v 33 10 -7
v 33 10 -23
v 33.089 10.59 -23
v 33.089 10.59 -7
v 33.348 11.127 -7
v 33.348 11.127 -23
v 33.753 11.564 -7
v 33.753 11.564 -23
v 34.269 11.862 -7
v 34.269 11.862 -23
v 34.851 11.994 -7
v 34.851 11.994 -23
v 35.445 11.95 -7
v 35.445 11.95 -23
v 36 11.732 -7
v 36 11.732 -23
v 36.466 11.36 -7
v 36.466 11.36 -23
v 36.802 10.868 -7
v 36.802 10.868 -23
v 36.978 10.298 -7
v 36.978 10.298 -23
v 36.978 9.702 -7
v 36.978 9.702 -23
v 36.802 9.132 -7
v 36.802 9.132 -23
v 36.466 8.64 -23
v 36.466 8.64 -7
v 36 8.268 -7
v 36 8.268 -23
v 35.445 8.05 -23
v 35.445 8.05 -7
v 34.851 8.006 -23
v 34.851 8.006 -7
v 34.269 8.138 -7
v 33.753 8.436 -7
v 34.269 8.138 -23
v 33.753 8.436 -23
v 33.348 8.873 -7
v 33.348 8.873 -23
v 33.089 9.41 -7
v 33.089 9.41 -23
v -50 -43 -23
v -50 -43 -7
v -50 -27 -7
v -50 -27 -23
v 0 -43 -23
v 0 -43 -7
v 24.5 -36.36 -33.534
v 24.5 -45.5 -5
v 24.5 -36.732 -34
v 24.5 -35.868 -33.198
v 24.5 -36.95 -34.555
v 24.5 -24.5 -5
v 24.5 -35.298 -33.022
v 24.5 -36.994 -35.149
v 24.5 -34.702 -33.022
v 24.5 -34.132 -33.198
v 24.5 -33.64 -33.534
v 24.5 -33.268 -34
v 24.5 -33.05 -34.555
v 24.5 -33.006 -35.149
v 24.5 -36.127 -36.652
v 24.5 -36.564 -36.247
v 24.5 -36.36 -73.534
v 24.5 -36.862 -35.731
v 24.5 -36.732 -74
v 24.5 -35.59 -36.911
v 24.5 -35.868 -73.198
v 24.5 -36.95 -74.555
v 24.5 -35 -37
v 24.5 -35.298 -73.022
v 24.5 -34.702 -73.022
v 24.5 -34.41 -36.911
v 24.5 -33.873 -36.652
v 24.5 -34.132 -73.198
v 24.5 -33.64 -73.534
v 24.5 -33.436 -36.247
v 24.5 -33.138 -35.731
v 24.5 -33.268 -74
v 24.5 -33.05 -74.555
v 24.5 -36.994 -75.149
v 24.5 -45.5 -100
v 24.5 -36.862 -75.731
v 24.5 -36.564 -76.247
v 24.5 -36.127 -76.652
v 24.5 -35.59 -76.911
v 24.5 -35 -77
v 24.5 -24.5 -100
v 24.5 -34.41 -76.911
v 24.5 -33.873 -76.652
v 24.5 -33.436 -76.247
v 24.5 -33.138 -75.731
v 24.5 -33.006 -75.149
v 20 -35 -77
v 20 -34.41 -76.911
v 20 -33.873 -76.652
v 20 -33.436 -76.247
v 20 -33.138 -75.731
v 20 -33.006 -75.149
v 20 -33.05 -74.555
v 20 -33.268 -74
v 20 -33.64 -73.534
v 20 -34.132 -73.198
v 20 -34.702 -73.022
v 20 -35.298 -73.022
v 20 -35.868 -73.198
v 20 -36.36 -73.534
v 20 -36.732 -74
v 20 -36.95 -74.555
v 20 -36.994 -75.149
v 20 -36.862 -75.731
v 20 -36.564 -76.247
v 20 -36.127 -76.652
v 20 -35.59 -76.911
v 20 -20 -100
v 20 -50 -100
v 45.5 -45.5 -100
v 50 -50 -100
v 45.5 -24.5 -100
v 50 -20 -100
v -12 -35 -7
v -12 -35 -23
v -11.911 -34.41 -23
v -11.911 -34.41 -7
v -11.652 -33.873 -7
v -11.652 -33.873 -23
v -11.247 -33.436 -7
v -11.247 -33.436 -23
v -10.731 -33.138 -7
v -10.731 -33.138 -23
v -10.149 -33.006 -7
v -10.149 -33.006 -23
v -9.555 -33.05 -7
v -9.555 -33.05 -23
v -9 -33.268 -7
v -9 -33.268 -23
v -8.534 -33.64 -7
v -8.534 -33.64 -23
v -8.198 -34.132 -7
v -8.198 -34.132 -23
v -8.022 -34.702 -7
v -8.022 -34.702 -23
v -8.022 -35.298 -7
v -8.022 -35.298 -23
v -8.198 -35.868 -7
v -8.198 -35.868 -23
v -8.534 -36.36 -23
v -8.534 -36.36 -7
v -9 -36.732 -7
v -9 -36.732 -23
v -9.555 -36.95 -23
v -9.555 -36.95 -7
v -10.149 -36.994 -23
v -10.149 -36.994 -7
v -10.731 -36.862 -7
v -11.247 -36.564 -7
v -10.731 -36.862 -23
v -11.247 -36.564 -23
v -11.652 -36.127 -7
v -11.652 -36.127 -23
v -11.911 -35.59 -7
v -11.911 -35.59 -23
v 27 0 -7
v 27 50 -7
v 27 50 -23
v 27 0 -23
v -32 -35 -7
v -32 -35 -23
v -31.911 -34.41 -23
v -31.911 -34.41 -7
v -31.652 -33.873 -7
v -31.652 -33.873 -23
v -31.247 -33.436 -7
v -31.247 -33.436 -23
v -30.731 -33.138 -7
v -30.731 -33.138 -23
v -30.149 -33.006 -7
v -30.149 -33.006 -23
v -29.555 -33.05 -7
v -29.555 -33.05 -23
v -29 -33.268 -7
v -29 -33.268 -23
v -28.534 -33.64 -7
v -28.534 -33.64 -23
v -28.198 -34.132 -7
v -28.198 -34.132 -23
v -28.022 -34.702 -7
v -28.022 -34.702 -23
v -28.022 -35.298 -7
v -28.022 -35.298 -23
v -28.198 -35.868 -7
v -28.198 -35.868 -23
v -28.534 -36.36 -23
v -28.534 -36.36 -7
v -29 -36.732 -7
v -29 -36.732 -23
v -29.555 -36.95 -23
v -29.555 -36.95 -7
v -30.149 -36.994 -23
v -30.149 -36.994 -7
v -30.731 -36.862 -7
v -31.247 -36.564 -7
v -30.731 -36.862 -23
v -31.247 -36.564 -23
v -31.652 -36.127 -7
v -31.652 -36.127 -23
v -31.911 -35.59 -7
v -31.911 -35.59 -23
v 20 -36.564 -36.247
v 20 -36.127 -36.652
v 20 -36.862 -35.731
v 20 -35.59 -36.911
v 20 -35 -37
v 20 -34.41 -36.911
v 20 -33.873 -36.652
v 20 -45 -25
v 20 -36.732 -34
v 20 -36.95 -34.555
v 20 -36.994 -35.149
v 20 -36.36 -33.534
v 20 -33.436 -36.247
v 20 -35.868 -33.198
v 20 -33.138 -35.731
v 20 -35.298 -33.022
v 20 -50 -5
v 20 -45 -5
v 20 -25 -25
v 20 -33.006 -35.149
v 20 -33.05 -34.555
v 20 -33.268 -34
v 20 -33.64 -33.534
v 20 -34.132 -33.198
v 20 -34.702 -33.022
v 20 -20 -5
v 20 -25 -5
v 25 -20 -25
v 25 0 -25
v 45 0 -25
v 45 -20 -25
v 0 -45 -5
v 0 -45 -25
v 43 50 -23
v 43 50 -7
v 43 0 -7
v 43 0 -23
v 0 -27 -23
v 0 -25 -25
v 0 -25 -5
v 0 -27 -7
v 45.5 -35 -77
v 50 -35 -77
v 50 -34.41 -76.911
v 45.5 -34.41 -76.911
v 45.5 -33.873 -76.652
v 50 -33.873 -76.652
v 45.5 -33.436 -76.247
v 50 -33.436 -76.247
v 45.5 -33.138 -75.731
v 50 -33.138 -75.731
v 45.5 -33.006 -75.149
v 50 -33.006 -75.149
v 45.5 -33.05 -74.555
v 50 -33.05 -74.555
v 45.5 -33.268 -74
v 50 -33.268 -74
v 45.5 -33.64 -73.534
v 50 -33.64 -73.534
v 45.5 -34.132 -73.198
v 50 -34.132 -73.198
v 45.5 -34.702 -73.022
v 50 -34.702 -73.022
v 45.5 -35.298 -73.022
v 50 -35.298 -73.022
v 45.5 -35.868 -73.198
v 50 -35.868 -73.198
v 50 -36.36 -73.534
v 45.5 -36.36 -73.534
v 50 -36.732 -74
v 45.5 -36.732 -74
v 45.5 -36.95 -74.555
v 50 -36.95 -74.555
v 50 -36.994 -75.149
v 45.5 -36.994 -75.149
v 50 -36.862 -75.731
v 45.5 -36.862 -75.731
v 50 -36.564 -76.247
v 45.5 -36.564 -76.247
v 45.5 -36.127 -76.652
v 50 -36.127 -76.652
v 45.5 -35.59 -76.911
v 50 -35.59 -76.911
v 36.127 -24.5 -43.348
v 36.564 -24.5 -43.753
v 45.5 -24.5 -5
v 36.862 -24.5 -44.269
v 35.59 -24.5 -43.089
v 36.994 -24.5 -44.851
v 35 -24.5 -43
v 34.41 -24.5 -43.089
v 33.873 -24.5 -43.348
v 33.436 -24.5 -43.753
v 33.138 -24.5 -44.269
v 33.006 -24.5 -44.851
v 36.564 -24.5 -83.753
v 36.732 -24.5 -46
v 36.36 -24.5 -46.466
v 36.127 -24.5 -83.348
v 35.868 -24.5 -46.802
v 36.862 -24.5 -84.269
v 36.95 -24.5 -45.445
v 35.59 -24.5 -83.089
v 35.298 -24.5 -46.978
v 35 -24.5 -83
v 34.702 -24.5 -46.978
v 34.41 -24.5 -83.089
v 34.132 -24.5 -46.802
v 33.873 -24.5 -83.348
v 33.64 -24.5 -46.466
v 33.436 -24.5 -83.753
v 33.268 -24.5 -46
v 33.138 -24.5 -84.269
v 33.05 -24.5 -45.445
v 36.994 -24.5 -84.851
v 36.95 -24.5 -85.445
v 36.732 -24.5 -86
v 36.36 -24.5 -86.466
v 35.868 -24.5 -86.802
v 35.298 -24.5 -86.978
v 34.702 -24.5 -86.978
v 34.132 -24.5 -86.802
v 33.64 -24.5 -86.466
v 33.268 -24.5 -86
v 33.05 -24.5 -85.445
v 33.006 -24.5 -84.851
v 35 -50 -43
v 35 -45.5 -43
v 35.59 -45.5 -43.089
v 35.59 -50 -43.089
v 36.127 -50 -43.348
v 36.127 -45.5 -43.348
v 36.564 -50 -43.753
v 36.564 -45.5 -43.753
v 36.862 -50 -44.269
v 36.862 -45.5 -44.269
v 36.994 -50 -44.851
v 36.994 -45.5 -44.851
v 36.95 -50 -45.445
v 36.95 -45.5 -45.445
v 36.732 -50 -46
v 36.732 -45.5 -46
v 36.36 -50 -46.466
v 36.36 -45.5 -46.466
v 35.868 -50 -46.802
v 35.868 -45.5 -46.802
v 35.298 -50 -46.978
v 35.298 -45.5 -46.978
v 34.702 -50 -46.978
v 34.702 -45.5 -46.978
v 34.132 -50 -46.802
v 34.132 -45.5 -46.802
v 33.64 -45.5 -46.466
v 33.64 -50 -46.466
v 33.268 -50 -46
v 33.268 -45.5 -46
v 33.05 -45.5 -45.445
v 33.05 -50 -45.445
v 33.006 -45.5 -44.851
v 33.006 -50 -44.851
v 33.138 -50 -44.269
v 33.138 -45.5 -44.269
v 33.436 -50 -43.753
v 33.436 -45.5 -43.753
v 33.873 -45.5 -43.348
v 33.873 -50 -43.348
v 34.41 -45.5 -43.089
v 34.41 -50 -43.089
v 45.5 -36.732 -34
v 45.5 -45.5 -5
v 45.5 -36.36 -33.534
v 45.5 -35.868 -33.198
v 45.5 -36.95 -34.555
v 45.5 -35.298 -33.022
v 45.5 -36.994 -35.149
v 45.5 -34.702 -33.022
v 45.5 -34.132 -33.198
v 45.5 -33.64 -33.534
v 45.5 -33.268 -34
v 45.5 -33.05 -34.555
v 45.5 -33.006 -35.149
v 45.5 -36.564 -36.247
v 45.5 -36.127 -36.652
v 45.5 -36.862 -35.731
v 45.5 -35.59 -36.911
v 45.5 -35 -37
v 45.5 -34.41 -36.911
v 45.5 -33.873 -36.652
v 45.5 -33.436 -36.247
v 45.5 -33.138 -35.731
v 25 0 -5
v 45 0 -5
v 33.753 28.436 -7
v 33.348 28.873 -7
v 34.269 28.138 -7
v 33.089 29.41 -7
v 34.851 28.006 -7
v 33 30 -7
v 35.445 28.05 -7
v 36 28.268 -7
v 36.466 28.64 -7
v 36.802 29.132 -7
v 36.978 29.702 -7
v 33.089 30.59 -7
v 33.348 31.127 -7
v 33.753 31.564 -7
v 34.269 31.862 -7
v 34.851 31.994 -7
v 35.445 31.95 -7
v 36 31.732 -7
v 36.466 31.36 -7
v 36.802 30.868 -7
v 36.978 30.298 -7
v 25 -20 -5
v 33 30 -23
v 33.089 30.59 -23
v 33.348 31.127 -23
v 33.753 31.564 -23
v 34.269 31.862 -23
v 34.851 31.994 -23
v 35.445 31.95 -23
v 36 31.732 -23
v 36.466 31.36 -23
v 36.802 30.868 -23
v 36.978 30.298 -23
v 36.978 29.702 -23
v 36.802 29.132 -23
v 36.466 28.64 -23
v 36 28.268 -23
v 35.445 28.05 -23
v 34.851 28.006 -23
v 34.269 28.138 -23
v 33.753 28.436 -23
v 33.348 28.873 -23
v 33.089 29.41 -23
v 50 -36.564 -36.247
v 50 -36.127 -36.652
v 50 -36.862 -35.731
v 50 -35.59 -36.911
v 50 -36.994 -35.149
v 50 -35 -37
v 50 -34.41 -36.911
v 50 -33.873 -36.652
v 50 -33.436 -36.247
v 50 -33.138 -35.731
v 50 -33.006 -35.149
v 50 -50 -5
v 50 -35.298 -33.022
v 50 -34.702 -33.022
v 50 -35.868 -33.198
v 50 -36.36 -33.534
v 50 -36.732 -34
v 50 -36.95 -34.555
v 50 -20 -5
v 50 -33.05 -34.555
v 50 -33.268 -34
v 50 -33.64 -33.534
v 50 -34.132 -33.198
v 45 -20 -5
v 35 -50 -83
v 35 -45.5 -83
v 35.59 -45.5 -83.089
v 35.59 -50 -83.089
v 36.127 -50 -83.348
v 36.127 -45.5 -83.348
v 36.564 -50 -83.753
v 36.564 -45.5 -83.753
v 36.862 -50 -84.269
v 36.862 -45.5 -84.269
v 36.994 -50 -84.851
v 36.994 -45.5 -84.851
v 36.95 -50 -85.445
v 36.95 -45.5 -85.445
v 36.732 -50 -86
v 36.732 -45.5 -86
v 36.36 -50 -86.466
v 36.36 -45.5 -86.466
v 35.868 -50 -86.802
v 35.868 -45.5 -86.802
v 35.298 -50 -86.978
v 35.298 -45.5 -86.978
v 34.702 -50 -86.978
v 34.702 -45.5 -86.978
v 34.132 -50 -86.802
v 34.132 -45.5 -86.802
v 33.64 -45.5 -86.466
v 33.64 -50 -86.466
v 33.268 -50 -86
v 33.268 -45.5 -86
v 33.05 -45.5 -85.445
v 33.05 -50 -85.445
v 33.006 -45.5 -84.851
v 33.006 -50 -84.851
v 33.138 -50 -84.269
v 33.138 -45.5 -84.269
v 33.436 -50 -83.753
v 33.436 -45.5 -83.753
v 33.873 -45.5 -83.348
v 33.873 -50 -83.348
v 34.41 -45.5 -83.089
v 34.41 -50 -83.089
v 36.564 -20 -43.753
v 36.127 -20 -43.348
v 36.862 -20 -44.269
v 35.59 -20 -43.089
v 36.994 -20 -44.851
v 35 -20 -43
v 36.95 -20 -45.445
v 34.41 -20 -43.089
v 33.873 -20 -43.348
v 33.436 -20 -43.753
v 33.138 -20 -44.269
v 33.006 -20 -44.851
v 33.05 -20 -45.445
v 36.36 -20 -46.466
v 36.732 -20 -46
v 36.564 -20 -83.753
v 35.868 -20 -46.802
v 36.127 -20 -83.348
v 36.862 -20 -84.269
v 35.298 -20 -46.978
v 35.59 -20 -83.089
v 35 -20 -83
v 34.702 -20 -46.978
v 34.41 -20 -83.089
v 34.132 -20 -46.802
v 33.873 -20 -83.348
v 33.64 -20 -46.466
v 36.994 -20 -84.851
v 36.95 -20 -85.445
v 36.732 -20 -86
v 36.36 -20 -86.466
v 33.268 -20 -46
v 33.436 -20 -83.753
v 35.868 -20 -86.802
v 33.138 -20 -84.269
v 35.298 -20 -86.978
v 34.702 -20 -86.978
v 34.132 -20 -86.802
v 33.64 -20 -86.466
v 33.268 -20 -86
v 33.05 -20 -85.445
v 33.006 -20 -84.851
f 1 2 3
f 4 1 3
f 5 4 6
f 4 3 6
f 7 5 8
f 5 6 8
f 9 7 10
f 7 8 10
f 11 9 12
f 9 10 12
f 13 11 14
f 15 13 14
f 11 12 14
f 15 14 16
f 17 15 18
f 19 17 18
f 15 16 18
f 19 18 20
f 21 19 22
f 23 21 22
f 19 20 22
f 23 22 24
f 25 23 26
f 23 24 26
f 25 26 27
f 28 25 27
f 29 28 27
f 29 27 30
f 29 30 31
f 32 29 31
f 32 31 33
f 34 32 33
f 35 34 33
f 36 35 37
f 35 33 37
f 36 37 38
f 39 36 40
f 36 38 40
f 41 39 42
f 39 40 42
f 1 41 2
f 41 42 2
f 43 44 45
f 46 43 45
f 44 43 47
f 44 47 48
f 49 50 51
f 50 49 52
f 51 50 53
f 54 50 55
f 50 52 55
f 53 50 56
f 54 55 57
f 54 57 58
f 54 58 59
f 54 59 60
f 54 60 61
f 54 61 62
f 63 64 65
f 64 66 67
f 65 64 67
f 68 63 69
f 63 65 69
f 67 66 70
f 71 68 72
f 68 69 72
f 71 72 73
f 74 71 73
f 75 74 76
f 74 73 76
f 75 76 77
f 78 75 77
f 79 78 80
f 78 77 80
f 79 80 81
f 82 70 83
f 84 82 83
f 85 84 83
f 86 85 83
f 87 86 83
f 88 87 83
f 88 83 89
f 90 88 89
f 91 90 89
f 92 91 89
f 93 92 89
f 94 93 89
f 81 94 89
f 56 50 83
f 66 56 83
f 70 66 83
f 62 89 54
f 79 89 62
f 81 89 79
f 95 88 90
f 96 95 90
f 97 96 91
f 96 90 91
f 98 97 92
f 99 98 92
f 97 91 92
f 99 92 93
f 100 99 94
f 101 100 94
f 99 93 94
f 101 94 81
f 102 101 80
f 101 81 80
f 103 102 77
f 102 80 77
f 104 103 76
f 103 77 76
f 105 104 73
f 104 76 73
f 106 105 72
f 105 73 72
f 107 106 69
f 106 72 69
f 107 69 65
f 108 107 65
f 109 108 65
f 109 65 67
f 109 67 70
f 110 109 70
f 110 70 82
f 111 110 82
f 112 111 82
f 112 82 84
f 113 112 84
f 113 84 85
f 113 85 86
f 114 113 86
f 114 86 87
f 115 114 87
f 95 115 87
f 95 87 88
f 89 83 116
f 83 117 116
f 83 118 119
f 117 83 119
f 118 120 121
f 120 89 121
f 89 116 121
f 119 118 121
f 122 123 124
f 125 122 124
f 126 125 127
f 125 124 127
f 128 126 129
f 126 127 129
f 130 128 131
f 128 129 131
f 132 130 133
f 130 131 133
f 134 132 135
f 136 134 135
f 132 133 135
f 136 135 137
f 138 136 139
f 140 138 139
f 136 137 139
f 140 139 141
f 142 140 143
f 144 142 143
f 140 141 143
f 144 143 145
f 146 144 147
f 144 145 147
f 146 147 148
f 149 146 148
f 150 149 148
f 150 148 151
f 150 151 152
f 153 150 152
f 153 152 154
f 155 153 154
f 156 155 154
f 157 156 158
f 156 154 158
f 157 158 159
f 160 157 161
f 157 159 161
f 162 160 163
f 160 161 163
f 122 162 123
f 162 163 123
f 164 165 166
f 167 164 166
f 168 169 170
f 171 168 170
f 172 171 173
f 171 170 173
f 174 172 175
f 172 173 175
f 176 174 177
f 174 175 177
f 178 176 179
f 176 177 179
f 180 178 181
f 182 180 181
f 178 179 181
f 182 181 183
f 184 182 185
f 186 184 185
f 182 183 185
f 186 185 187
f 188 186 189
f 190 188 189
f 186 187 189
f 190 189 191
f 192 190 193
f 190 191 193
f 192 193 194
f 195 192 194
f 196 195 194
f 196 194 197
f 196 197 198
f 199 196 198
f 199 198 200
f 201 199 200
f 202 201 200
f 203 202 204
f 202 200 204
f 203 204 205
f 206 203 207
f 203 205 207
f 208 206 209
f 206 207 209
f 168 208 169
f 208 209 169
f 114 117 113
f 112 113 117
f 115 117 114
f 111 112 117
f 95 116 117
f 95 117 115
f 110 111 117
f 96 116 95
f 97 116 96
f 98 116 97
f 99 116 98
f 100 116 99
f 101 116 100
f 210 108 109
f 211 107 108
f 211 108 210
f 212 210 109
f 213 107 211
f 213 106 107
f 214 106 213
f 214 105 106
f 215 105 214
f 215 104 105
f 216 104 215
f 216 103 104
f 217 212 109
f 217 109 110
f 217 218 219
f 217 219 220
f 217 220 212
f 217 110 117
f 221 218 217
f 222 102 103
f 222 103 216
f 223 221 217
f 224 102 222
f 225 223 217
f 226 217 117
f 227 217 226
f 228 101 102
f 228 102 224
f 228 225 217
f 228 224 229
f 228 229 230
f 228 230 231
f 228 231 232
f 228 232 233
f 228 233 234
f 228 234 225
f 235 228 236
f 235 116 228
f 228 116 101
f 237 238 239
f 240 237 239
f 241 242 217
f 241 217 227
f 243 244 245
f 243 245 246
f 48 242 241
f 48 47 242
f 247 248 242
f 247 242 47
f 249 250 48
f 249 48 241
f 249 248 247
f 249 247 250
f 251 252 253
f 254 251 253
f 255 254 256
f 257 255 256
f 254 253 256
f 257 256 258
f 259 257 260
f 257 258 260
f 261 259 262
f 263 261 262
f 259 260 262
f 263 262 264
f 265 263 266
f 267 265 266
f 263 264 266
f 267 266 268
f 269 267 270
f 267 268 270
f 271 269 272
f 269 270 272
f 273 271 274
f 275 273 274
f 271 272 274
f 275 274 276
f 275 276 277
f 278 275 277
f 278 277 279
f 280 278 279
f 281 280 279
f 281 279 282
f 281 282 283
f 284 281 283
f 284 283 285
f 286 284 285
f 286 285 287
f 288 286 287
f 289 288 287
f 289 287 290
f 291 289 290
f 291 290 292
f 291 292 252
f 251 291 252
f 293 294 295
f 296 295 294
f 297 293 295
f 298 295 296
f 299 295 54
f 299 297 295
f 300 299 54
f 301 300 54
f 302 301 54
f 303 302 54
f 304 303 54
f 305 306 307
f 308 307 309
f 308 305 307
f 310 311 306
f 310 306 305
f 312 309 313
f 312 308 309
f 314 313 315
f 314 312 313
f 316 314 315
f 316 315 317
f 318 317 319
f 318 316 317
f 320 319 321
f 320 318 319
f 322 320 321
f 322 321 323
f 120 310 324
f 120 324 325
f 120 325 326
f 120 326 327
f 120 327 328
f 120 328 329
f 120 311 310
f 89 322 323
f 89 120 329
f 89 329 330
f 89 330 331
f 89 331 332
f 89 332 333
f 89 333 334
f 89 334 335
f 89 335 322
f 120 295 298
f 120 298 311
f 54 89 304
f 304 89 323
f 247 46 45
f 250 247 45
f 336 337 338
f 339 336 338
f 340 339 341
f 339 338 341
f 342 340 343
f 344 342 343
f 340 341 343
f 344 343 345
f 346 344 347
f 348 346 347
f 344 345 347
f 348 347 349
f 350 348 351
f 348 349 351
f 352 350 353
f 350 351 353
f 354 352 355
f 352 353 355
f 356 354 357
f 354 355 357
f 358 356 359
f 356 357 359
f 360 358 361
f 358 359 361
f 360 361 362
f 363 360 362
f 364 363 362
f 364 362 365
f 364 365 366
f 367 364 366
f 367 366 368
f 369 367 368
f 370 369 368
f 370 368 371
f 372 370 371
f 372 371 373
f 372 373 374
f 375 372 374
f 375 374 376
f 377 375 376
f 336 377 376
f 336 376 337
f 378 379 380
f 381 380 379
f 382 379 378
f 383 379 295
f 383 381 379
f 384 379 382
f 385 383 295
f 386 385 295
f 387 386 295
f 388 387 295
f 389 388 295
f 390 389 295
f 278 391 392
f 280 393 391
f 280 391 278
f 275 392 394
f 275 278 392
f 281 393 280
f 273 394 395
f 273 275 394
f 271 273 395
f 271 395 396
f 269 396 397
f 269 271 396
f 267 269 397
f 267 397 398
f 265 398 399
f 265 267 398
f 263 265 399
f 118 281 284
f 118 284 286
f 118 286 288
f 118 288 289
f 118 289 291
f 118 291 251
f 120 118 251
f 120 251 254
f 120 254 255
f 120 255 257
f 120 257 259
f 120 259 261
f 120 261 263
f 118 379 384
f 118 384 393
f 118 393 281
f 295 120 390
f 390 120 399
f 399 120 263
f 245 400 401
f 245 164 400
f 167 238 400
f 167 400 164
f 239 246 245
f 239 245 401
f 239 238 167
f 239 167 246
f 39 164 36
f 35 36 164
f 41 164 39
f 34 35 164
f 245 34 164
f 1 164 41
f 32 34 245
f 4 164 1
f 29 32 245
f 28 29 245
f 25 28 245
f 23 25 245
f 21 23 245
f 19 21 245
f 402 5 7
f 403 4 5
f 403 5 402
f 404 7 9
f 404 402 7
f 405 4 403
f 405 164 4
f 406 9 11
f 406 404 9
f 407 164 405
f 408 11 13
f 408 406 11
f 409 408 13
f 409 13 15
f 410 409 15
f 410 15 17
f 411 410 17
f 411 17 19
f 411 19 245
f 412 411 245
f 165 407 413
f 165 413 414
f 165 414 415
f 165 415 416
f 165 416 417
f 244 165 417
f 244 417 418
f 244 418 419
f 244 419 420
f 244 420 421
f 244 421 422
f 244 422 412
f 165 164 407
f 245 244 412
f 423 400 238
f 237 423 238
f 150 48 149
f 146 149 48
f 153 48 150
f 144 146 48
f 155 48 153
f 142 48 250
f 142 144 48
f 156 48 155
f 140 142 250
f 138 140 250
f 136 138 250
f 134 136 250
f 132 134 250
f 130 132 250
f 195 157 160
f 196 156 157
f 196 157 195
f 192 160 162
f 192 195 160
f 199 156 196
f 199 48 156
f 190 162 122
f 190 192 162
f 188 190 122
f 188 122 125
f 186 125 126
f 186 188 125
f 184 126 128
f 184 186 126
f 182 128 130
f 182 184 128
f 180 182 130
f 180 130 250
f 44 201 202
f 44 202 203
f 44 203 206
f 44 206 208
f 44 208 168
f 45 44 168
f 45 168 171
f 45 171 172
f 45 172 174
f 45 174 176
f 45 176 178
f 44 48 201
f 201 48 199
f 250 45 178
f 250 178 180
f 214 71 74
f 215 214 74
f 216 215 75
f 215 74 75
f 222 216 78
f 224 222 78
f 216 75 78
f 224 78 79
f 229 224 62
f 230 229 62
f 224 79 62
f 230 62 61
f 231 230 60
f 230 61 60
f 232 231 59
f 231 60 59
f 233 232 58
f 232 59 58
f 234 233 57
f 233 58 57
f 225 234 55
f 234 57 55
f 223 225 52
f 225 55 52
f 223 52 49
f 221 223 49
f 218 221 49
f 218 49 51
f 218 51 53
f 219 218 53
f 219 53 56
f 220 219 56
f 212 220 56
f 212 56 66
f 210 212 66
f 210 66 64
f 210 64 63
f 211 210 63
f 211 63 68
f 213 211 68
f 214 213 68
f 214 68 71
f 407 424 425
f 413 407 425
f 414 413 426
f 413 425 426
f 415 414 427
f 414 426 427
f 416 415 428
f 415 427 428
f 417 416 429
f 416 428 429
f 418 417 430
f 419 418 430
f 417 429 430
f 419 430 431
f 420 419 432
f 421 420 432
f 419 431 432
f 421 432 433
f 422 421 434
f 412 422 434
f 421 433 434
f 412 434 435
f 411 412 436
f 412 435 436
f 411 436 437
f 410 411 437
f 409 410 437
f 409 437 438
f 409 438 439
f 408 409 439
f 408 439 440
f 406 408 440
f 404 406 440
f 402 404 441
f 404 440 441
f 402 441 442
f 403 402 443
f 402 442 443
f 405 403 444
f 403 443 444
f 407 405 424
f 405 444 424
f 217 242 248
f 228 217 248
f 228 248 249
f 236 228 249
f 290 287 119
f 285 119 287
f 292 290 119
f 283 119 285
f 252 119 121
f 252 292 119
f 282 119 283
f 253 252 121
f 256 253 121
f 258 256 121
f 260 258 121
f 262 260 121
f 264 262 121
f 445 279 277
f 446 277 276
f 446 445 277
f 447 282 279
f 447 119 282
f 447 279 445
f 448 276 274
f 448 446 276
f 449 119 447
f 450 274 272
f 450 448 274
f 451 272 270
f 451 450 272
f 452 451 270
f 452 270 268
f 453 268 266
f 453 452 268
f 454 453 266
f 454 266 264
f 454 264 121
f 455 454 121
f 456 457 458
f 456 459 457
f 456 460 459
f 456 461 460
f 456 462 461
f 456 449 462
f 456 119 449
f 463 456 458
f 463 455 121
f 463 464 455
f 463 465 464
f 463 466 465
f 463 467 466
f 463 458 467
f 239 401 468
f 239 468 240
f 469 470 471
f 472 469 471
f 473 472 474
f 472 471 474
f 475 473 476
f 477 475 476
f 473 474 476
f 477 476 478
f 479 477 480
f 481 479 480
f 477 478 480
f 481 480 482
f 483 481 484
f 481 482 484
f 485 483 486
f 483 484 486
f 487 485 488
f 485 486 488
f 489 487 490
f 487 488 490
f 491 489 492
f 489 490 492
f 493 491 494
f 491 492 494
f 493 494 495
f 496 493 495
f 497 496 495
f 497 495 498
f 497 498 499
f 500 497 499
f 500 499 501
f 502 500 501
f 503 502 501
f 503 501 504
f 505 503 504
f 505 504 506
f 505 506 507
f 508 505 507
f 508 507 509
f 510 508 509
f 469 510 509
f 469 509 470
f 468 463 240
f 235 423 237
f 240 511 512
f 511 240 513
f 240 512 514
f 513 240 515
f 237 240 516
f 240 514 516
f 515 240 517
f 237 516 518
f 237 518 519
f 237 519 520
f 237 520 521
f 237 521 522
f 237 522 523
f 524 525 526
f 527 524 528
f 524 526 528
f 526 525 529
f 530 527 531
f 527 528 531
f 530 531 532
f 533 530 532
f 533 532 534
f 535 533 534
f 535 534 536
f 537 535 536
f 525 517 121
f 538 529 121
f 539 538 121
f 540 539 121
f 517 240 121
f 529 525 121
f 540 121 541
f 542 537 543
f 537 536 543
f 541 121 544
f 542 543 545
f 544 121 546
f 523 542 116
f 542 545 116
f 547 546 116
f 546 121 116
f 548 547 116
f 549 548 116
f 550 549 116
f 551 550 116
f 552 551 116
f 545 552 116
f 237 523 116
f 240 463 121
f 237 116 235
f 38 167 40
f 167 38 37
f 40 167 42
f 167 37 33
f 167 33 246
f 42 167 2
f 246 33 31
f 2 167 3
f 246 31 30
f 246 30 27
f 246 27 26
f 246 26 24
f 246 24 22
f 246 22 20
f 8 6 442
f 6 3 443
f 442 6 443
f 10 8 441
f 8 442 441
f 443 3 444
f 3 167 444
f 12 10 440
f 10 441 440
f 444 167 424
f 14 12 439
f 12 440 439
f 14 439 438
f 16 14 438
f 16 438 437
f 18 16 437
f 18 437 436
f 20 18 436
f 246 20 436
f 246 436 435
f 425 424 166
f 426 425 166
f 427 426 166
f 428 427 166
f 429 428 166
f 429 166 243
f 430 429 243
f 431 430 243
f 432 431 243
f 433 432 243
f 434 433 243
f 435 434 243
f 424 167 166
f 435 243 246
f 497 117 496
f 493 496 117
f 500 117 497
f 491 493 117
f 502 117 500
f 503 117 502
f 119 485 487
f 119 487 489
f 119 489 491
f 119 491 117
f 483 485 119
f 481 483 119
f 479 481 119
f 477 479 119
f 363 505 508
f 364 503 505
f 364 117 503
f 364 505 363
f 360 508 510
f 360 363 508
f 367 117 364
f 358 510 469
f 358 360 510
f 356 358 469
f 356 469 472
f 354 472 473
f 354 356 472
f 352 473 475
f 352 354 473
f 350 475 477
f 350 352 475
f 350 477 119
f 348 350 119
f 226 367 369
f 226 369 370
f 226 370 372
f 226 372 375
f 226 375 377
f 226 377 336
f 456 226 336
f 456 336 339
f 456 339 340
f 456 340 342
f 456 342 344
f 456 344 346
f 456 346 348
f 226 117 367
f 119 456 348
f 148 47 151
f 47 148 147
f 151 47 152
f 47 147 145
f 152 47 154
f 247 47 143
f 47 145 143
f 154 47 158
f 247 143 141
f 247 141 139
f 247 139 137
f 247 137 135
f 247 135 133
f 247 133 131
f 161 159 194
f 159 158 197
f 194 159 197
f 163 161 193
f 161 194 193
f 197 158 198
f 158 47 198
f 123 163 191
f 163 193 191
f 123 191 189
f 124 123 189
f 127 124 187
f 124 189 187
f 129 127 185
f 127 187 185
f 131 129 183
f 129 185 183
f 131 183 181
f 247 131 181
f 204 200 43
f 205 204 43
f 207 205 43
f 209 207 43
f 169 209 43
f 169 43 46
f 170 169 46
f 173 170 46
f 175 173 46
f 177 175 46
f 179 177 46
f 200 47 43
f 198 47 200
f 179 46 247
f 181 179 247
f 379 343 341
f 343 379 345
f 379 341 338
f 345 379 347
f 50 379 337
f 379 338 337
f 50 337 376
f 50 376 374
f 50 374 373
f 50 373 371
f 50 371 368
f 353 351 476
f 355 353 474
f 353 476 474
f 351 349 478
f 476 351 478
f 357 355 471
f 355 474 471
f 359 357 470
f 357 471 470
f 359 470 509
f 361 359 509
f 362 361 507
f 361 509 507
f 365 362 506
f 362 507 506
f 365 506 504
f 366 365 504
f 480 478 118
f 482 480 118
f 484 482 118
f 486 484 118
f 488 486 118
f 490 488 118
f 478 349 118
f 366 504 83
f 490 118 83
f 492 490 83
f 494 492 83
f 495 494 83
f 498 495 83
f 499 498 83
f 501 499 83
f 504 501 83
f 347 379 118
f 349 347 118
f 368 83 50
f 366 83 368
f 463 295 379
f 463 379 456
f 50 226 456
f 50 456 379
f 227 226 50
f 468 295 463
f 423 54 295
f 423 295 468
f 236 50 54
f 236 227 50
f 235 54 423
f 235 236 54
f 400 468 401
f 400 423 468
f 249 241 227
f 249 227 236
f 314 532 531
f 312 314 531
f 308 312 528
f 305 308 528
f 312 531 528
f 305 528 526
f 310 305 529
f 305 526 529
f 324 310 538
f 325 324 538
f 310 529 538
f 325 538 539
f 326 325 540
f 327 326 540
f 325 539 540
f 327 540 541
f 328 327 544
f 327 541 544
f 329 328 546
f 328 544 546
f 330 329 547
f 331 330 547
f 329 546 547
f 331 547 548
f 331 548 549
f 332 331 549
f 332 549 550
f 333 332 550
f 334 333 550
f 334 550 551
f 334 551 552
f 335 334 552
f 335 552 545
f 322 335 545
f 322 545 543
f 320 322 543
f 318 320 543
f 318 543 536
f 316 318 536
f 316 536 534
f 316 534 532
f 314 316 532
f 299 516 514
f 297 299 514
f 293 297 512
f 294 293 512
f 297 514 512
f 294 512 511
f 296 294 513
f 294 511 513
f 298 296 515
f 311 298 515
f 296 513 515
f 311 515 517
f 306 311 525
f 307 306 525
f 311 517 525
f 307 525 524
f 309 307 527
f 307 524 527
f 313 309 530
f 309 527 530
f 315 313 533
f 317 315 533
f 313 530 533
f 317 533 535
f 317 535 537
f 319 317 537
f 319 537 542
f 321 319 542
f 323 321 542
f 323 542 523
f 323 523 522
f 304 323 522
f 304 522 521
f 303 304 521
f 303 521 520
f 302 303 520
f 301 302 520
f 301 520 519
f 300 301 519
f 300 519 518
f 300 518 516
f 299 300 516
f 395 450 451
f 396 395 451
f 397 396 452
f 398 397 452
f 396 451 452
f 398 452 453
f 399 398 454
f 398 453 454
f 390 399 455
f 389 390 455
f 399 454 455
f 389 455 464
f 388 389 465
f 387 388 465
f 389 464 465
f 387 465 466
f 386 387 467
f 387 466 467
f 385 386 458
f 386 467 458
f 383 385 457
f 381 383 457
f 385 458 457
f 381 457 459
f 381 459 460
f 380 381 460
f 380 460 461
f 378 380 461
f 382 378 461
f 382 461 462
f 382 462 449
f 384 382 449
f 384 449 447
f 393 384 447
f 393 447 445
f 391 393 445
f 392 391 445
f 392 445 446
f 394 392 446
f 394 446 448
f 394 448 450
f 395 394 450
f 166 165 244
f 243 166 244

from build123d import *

# Parameters (mm, degrees)
SKETCH1_W           = 100
SKETCH1_H           = 100
BOSS_EXTRUDE1_DEPTH = 100
CUT_EXTRUDE16_DEPTH = 70
SKETCH8_W           = 70
SKETCH8_H           = 70
CUT_EXTRUDE17_DEPTH = 30
SKETCH9_W           = 21
SKETCH9_H           = 21
CUT_EXTRUDE20_DEPTH = 100
SKETCH10_W          = 30
SKETCH10_H          = 30
SKETCH10_W_2        = 16
SKETCH10_H_2        = 16
CUT_EXTRUDE21_DEPTH = 50
SKETCH11_W          = 30
SKETCH11_H          = 30
SKETCH11_W_2        = 20
SKETCH11_H_2        = 20
CUT_EXTRUDE22_DEPTH = 20
SKETCH12_W          = 30
SKETCH12_H          = 30
SKETCH12_W_2        = 20
SKETCH12_H_2        = 20
CUT_EXTRUDE23_DEPTH = 70
SKETCH13_W          = 20
SKETCH13_H          = 20
SKETCH13_W_2        = 16
SKETCH13_H_2        = 16
CUT_EXTRUDE24_DEPTH = 50
SKETCH15_R          = 2
CUT_EXTRUDE25_DEPTH = 30
SKETCH16_R          = 2
CUT_EXTRUDE26_DEPTH = 30
SKETCH17_R          = 2
CUT_EXTRUDE27_DEPTH = 16
SKETCH18_R          = 2
CUT_EXTRUDE29_DEPTH = 16
SKETCH19_W          = 30
SKETCH19_H          = 30
CUT_EXTRUDE30_DEPTH = 5


with BuildPart() as part:
    # Sketch1 → Boss-Extrude1 (new body)
    with BuildSketch(Plane.XY):
        Rectangle(SKETCH1_W, SKETCH1_H)
    extrude(amount=-BOSS_EXTRUDE1_DEPTH)

    # Sketch5 → Cut-Extrude16 (cut)
    with BuildSketch(Plane(origin=(0, 0, -100), x_dir=(-1, 0, 0), z_dir=(0, 0, -1))):
        Polygon((50, -50), (50, 50), (-50, 50), (-50, -20), (-20, -20), (-20, -50), align=None)
    extrude(amount=-CUT_EXTRUDE16_DEPTH, mode=Mode.SUBTRACT)

    # Sketch8 → Cut-Extrude17 (cut)
    with BuildSketch(Plane(origin=(0, 0, -30), x_dir=(-1, 0, 0), z_dir=(0, 0, -1))):
        with Locations((15, 15)):
            Rectangle(SKETCH8_W, SKETCH8_H)
    extrude(amount=-CUT_EXTRUDE17_DEPTH, mode=Mode.SUBTRACT)

    # Sketch9 → Cut-Extrude20 (cut)
    with BuildSketch(Plane(origin=(0, 0, -100), x_dir=(-1, 0, 0), z_dir=(0, 0, -1))):
        with Locations((-35, -35)):
            Rectangle(SKETCH9_W, SKETCH9_H)
    extrude(amount=-CUT_EXTRUDE20_DEPTH, mode=Mode.SUBTRACT)

    # Sketch10 → Cut-Extrude21 (cut)
    with BuildSketch(Plane.ZY.offset(50)):
        with Locations((-15, -35)):
            Rectangle(SKETCH10_W, SKETCH10_H)
        with Locations((-15, -35)):
            Rectangle(SKETCH10_W_2, SKETCH10_H_2, mode=Mode.SUBTRACT)
    extrude(amount=-CUT_EXTRUDE21_DEPTH, mode=Mode.SUBTRACT)

    # Sketch11 → Cut-Extrude22 (cut)
    with BuildSketch(Plane.ZY):
        with Locations((-15, -35)):
            Rectangle(SKETCH11_W, SKETCH11_H)
        with Locations((-15, -35)):
            Rectangle(SKETCH11_W_2, SKETCH11_H_2, mode=Mode.SUBTRACT)
    extrude(amount=-CUT_EXTRUDE22_DEPTH, mode=Mode.SUBTRACT)

    # Sketch12 → Cut-Extrude23 (cut)
    with BuildSketch(Plane(origin=(0, 50, 0), x_dir=(1, 0, 0), z_dir=(0, 1, 0))):
        with Locations((35, 15)):
            Rectangle(SKETCH12_W, SKETCH12_H)
        with Locations((35, 15)):
            Rectangle(SKETCH12_W_2, SKETCH12_H_2, mode=Mode.SUBTRACT)
    extrude(amount=-CUT_EXTRUDE23_DEPTH, mode=Mode.SUBTRACT)

    # Sketch13 → Cut-Extrude24 (cut)
    with BuildSketch(Plane(origin=(0, 50, 0), x_dir=(1, 0, 0), z_dir=(0, 1, 0))):
        with Locations((35, 15)):
            Rectangle(SKETCH13_W, SKETCH13_H)
        with Locations((35, 15)):
            Rectangle(SKETCH13_W_2, SKETCH13_H_2, mode=Mode.SUBTRACT)
    extrude(amount=-CUT_EXTRUDE24_DEPTH, mode=Mode.SUBTRACT)

    # Sketch15 → Cut-Extrude25 (cut)
    with BuildSketch(Plane(origin=(0, -20, 0), x_dir=(1, 0, 0), z_dir=(0, 1, 0))):
        with Locations(Location((35, 85, 0), (0, 0, 270))):
            Circle(SKETCH15_R)
        with Locations(Location((35, 45, 0), (0, 0, 270))):
            Circle(SKETCH15_R)
    extrude(amount=-CUT_EXTRUDE25_DEPTH, mode=Mode.SUBTRACT)

    # Sketch16 → Cut-Extrude26 (cut)
    with BuildSketch(Plane(origin=(50, 0, 0), x_dir=(0, 0, -1), z_dir=(1, 0, 0))):
        with Locations((75, -35)):
            Circle(SKETCH16_R)
        with Locations((35, -35)):
            Circle(SKETCH16_R)
    extrude(amount=-CUT_EXTRUDE26_DEPTH, mode=Mode.SUBTRACT)

    # Sketch17 → Cut-Extrude27 (cut)
    with BuildSketch(Plane(origin=(0, 0, -23), x_dir=(-1, 0, 0), z_dir=(0, 0, -1))):
        with Locations((-35, 30)):
            Circle(SKETCH17_R)
        with Locations((-35, 10)):
            Circle(SKETCH17_R)
    extrude(amount=-CUT_EXTRUDE27_DEPTH, mode=Mode.SUBTRACT)

    # Sketch18 → Cut-Extrude29 (cut)
    with BuildSketch(Plane(origin=(0, 0, -23), x_dir=(-1, 0, 0), z_dir=(0, 0, -1))):
        with Locations((30, -35)):
            Circle(SKETCH18_R)
        with Locations((10, -35)):
            Circle(SKETCH18_R)
    extrude(amount=-CUT_EXTRUDE29_DEPTH, mode=Mode.SUBTRACT)

    # Sketch19 → Cut-Extrude30 (cut)
    with BuildSketch(Plane.XY):
        with Locations((35, -35)):
            Rectangle(SKETCH19_W, SKETCH19_H)
    extrude(amount=-CUT_EXTRUDE30_DEPTH, mode=Mode.SUBTRACT)


solid = part.part
